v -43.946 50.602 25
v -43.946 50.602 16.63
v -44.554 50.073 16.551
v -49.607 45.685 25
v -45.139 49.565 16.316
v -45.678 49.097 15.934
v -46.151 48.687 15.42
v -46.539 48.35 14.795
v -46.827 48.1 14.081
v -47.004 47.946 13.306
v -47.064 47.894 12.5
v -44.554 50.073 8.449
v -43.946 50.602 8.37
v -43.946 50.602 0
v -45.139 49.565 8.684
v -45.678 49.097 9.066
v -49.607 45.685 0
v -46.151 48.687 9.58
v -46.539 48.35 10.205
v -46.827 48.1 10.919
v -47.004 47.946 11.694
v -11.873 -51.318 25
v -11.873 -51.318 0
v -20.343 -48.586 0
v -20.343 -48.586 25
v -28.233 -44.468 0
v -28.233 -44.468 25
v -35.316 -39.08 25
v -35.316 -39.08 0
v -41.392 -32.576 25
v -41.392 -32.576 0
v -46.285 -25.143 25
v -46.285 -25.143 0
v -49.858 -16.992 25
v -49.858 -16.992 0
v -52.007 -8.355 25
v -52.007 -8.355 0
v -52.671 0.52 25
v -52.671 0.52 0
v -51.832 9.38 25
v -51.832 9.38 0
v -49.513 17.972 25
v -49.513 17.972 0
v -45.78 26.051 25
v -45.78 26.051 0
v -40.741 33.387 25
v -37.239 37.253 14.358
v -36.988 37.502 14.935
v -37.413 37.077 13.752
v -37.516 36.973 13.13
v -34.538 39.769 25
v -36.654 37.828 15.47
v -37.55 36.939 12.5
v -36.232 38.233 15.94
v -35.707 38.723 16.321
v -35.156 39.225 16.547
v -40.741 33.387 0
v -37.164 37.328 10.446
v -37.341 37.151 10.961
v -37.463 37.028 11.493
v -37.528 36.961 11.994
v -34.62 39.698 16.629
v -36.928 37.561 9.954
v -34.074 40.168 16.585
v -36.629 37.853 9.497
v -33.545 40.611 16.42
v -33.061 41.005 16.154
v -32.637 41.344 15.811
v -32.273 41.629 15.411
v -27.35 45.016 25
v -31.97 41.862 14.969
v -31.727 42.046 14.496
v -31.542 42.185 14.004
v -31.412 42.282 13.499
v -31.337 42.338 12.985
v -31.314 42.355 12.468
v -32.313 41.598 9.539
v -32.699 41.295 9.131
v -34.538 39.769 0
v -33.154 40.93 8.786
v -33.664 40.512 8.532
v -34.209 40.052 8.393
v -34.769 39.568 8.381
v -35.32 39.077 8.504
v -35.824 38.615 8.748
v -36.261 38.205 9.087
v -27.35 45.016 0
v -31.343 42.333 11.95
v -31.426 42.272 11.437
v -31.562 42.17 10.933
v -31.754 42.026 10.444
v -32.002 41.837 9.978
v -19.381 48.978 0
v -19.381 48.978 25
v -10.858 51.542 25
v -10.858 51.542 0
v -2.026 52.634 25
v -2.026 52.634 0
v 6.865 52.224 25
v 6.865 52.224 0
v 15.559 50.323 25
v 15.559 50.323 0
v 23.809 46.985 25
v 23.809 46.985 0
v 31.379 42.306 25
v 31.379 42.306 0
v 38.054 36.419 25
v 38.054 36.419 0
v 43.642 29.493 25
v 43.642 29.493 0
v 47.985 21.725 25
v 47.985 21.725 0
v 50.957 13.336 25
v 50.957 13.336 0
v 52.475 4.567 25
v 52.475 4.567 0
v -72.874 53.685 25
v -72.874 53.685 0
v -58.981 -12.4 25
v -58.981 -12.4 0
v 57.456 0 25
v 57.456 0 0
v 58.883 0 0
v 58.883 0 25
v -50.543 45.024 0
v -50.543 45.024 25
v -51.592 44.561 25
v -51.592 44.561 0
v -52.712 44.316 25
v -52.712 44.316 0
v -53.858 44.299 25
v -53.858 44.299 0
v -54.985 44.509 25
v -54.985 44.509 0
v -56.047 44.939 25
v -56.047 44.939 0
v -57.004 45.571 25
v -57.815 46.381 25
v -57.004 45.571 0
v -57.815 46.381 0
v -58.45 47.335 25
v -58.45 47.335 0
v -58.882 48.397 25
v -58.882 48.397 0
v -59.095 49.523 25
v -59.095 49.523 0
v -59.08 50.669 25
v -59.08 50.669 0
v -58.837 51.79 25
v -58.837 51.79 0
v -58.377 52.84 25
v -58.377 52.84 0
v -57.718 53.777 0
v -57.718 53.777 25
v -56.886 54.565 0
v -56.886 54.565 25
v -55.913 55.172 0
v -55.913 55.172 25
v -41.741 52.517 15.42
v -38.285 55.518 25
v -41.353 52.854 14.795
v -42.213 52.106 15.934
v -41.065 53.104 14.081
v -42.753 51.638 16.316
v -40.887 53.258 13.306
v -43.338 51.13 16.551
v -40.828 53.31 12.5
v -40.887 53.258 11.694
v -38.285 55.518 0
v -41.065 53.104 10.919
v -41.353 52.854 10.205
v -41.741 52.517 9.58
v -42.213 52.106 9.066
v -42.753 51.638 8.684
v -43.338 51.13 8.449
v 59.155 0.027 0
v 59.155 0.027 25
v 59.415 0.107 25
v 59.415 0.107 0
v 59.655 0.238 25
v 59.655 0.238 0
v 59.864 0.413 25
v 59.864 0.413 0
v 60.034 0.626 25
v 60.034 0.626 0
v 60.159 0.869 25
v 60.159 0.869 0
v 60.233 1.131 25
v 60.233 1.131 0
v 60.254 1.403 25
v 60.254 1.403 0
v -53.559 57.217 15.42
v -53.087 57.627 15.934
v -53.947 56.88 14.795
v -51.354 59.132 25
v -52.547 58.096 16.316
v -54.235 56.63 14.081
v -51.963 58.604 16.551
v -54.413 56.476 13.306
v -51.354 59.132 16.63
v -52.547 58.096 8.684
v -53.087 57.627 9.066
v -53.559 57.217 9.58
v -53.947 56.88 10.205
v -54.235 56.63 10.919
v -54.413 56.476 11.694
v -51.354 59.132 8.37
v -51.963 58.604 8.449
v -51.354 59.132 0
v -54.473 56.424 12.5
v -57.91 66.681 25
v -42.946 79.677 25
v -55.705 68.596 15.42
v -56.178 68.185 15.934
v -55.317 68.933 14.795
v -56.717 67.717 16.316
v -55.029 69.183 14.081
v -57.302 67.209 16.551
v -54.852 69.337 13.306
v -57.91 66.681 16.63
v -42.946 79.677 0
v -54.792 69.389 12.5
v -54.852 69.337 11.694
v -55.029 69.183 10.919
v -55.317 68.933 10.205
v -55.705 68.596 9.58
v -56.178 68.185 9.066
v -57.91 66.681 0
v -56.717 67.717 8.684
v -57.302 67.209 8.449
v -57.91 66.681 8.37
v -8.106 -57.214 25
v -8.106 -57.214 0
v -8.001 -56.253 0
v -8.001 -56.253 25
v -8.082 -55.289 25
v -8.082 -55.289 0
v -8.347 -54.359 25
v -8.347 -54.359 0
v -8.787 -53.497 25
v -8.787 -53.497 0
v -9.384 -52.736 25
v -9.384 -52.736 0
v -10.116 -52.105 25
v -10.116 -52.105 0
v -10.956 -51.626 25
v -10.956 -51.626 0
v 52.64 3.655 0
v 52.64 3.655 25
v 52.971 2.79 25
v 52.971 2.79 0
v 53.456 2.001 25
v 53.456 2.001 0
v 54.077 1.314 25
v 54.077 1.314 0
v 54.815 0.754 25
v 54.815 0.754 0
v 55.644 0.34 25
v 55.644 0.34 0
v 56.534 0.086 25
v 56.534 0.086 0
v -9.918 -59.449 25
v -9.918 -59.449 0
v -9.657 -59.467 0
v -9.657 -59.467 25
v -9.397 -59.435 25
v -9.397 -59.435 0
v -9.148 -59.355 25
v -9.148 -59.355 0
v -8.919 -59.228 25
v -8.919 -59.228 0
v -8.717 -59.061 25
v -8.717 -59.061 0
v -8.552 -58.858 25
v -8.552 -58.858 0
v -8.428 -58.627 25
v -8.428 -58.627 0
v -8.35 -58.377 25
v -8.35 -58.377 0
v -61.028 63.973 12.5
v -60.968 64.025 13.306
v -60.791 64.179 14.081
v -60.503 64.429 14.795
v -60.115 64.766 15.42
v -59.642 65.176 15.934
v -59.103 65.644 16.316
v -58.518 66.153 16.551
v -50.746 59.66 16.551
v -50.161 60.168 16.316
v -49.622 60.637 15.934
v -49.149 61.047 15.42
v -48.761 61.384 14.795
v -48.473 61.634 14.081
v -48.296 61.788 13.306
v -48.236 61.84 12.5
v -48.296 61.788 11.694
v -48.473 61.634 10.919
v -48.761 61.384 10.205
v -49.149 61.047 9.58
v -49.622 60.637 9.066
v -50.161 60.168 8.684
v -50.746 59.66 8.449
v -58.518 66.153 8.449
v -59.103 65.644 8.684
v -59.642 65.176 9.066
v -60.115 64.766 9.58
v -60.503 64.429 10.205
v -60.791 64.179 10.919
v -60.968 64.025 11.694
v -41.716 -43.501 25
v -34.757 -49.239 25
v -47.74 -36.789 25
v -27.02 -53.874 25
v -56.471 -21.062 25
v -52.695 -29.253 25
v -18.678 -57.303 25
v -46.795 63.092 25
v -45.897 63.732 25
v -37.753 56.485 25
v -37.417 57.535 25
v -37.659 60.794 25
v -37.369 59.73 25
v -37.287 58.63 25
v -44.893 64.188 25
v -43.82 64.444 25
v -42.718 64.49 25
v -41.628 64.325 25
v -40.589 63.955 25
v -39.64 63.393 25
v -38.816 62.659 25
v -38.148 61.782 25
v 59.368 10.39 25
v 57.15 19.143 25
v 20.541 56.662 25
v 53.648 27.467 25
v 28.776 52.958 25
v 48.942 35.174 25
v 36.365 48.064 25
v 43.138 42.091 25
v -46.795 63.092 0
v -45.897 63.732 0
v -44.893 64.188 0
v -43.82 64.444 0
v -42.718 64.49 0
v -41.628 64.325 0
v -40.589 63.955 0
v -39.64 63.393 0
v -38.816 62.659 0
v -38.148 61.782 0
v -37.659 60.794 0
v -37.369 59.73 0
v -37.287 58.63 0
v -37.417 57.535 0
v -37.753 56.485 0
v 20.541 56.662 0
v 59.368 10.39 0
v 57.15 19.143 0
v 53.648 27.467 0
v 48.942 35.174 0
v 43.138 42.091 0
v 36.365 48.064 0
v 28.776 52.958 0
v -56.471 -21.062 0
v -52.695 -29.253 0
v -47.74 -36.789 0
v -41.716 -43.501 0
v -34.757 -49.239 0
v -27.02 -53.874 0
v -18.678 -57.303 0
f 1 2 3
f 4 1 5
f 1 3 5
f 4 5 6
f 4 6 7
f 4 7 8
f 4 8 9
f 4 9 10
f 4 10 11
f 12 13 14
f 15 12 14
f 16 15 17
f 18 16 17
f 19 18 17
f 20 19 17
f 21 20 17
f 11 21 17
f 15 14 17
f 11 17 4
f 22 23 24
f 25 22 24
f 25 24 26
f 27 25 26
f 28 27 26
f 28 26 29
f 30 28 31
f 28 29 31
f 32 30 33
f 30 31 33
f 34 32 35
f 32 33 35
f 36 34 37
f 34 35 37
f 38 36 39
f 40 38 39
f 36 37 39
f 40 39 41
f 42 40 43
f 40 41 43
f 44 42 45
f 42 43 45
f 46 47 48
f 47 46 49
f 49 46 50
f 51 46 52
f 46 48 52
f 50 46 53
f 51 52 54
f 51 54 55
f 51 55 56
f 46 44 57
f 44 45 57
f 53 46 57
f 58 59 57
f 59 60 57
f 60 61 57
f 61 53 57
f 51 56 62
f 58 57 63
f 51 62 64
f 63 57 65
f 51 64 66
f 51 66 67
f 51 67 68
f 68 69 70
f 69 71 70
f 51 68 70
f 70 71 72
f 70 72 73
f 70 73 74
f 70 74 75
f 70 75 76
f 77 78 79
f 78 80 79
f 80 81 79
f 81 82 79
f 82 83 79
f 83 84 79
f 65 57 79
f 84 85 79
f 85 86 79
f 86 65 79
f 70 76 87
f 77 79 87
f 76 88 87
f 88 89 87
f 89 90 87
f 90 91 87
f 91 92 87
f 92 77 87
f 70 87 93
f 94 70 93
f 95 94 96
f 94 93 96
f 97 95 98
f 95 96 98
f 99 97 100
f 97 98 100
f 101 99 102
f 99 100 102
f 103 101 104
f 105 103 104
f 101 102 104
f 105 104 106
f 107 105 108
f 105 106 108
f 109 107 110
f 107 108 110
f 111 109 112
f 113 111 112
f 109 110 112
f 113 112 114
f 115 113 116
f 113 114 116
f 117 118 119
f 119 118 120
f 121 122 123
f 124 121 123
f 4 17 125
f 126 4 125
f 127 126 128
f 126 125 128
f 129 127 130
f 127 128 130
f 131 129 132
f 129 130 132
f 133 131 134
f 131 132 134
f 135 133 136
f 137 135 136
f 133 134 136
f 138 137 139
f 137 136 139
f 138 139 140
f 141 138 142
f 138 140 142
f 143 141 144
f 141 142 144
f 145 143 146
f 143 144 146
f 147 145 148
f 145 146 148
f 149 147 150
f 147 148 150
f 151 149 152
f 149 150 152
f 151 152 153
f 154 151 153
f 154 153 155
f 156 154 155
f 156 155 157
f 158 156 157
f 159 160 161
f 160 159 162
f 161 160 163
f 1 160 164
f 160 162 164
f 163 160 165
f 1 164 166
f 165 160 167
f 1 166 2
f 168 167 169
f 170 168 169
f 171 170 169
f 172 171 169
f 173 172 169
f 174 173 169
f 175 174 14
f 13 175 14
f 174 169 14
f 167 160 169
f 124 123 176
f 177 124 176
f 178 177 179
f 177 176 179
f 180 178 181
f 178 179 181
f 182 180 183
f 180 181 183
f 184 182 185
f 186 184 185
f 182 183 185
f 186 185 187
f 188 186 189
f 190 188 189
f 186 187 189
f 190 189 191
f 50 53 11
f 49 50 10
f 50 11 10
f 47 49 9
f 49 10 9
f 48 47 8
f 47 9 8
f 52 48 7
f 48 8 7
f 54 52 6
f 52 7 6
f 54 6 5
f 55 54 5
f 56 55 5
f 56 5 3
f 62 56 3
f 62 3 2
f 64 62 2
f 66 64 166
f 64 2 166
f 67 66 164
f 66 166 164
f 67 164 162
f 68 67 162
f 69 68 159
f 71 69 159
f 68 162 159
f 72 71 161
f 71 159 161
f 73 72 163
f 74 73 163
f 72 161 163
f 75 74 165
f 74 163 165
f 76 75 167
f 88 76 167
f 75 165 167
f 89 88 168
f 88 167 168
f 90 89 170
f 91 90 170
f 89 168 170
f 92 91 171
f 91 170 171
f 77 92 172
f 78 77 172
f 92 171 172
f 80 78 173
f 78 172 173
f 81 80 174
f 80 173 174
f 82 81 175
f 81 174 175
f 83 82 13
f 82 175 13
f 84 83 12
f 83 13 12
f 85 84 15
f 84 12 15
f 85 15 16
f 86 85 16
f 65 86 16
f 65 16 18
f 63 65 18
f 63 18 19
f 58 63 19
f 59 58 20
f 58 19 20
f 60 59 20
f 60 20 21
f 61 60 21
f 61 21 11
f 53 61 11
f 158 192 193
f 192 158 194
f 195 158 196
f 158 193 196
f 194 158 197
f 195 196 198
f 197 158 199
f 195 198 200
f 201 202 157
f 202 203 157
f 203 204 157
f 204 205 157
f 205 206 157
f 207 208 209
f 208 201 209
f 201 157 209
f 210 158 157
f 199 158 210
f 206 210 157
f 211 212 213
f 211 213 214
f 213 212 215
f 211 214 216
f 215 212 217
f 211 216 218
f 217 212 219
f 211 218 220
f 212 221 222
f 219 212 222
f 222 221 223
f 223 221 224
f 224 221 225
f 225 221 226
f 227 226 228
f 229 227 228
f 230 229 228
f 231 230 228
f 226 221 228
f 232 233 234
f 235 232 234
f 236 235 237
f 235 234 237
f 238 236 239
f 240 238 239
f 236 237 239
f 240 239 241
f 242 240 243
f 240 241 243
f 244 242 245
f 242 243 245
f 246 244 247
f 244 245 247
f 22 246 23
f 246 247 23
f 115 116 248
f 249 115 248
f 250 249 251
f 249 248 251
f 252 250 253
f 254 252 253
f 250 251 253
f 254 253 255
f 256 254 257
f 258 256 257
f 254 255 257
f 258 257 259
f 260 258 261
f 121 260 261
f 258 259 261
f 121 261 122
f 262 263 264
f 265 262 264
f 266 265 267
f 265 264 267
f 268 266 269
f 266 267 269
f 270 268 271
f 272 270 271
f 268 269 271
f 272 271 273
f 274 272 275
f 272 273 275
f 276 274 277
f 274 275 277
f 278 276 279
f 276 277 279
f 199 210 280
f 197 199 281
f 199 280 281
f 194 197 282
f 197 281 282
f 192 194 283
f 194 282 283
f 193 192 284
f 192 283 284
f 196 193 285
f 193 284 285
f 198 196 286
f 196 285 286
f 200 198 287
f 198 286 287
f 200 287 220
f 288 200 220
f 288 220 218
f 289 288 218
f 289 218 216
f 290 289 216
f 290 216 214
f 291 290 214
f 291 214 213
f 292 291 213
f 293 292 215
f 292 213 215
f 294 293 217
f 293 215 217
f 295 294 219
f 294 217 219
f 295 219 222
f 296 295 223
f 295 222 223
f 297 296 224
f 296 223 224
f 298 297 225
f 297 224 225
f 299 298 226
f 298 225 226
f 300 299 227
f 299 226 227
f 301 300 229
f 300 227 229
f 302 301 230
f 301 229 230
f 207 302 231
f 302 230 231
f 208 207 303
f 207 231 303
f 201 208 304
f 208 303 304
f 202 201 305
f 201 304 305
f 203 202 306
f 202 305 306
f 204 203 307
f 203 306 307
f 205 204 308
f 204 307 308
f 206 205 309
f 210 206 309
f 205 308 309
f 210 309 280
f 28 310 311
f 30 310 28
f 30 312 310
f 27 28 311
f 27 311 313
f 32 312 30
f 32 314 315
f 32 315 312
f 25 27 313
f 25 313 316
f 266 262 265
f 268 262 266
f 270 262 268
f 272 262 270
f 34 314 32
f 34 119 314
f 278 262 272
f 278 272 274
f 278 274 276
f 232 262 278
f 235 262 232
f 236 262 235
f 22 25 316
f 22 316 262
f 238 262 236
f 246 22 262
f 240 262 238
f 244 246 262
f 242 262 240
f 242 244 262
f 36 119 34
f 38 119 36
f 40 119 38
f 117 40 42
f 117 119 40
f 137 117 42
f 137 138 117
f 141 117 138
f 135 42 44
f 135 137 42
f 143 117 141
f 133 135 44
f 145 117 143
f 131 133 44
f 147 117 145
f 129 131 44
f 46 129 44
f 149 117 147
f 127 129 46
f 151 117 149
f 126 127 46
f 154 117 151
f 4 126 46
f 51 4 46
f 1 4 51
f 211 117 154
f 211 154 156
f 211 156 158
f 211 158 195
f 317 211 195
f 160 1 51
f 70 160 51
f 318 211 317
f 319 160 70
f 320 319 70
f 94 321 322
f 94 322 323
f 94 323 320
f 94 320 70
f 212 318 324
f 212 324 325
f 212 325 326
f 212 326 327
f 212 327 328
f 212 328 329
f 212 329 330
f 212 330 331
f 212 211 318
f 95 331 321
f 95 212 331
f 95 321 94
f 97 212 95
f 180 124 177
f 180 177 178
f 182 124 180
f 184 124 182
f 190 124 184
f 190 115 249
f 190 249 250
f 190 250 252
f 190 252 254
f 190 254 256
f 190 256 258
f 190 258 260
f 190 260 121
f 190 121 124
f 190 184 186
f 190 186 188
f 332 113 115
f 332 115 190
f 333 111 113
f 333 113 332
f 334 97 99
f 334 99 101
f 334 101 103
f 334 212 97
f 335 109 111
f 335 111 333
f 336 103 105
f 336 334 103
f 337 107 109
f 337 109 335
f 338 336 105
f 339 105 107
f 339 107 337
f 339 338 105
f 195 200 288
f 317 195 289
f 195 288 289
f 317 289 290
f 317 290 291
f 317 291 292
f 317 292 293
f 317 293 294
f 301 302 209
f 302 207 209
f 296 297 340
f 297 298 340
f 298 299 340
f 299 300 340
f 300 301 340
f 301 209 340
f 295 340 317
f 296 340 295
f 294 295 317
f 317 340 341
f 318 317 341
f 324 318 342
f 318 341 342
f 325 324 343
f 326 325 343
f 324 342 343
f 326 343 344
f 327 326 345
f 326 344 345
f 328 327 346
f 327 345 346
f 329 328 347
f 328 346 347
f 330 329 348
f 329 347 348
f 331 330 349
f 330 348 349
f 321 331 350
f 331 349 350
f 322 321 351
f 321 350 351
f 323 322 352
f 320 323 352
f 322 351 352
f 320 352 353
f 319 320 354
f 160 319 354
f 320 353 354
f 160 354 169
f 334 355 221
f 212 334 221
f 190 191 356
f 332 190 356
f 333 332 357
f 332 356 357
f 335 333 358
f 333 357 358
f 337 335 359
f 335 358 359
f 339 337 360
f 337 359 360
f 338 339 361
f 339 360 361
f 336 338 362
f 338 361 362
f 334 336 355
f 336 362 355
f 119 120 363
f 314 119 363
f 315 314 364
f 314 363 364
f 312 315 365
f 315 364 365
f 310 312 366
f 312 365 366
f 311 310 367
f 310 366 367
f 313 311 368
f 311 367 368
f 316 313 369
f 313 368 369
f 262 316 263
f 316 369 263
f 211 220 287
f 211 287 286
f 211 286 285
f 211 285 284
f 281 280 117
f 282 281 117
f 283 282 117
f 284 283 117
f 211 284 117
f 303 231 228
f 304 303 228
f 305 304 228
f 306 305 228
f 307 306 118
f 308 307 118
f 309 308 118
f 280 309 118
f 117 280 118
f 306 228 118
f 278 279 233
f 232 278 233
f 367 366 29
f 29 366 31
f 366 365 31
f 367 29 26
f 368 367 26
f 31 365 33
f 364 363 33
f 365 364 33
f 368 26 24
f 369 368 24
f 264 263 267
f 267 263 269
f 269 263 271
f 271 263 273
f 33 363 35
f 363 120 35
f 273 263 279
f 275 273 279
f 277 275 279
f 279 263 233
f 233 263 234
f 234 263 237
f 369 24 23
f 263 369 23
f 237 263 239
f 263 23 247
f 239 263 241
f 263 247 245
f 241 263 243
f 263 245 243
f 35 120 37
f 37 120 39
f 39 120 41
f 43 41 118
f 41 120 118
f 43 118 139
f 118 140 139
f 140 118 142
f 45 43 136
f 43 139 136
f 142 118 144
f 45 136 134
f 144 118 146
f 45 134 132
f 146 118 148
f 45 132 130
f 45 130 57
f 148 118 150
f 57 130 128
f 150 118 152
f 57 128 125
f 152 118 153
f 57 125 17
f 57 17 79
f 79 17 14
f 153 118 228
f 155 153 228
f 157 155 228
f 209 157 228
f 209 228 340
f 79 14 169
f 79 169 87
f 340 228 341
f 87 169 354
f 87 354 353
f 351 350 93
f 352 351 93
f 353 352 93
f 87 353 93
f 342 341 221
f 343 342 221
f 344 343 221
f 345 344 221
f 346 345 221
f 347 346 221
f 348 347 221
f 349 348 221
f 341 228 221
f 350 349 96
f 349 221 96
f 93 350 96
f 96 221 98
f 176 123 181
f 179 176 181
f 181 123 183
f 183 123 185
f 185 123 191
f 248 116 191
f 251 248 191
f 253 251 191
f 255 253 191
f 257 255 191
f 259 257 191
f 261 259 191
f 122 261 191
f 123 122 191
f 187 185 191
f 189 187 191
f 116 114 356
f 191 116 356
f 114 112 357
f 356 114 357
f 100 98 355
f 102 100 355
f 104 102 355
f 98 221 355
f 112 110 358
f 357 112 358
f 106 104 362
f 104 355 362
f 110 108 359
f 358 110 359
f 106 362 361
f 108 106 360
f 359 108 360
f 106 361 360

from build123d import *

# Parameters (mm, degrees)
F1_DEPTH = 25
F2_R     = 4.1301818337
F3_DEPTH = 100


with BuildPart() as f1:
    # F0 (on Top) → F1 (new body)
    with BuildSketch(Plane.XY):
        with BuildLine():
            ThreePointArc((-11.8732422152, -51.317779651), (-34.5382601184, 39.7692969136), (52.4750916265, 4.5665246966))
            ThreePointArc((52.4750916265, 4.5665246966), (54.0774628024, 1.3143944516), (57.4562661026, 0))
            Line((57.4562661026, 0), (58.8832582744, 0))
            ThreePointArc((58.8832582744, 0), (59.8641668401, 0.4130116778), (60.2542282129, 1.4032704246))
            ThreePointArc((60.2542282129, 1.4032704246), (48.9422337618, 35.1738388554), (20.5405661504, 56.662389004))
            ThreePointArc((20.5405661504, 56.662389004), (-0.9722097104, 60.2627247451), (-22.357653118, 55.9703183167))
            ThreePointArc((-22.357653118, 55.9703183167), (-39.5197577392, 45.5052736905), (-52.2859987864, 29.978584295))
            ThreePointArc((-52.2859987864, 29.978584295), (-59.5321694387, 9.4054232943), (-58.9812803638, -12.3995867702))
            ThreePointArc((-58.9812803638, -12.3995867702), (-41.7155504969, -43.5011957555), (-9.9179813794, -59.4489262374))
            ThreePointArc((-9.9179813794, -59.4489262374), (-8.9185295501, -59.2284594054), (-8.3500885012, -58.3773516818))
            Line((-8.3500885012, -58.3773516818), (-8.1064542321, -57.2139043997))
            ThreePointArc((-8.1064542321, -57.2139043997), (-8.786764538, -53.4972420783), (-11.8732422152, -51.317779651))
        make_face()
        with BuildLine():
            ThreePointArc((-22.357653118, 55.9703183167), (-0.9722097104, 60.2627247451), (20.5405661504, 56.662389004))
            Line((20.5405661504, 56.662389004), (-42.9458399328, 79.6767155568))
            Line((-42.9458399328, 79.6767155568), (-22.357653118, 55.9703183167))
        make_face()
        with BuildLine():
            Line((-72.8741856011, 53.6849815351), (-58.9812803638, -12.3995867702))
            ThreePointArc((-58.9812803638, -12.3995867702), (-59.5321694387, 9.4054232943), (-52.2859987864, 29.978584295))
            Line((-52.2859987864, 29.978584295), (-72.8741856011, 53.6849815351))
        make_face()
        with BuildLine():
            ThreePointArc((-52.2859987864, 29.978584295), (-39.5197577392, 45.5052736905), (-22.357653118, 55.9703183167))
            Line((-22.357653118, 55.9703183167), (-42.9458399328, 79.6767155568))
            Line((-42.9458399328, 79.6767155568), (-57.910012767, 66.680848546))
            Line((-57.910012767, 66.680848546), (-72.8741856011, 53.6849815351))
            Line((-72.8741856011, 53.6849815351), (-52.2859987864, 29.978584295))
        make_face()
        with BuildLine():
            Line((-55.9134628832, 55.172447865), (-51.3541472465, 59.1320559457))
            Line((-51.3541472465, 59.1320559457), (-46.7948316098, 63.0916640263))
            ThreePointArc((-46.7948316098, 63.0916640263), (-39.210764144, 63.0457975526), (-38.2846281265, 55.5183507652))
            Line((-38.2846281265, 55.5183507652), (-43.9458746166, 50.6017538162))
            Line((-43.9458746166, 50.6017538162), (-49.6071211066, 45.6851568672))
            ThreePointArc((-49.6071211066, 45.6851568672), (-58.1561290716, 46.8421101497), (-55.9134628832, 55.172447865))
        make_face(mode=Mode.SUBTRACT)
    extrude(amount=F1_DEPTH)

    # F2 (on face) → F3 (cut)
    with BuildSketch(Plane(origin=(-57.910012767, 66.680848546, 0), x_dir=(-0.7550165253, -0.6557057622, 0), z_dir=(-0.6557057622, 0.7550165253, 0))):
        with Locations((0, 12.5)):
            Circle(F2_R)
    extrude(amount=-F3_DEPTH, mode=Mode.SUBTRACT)


solid = f1.part
